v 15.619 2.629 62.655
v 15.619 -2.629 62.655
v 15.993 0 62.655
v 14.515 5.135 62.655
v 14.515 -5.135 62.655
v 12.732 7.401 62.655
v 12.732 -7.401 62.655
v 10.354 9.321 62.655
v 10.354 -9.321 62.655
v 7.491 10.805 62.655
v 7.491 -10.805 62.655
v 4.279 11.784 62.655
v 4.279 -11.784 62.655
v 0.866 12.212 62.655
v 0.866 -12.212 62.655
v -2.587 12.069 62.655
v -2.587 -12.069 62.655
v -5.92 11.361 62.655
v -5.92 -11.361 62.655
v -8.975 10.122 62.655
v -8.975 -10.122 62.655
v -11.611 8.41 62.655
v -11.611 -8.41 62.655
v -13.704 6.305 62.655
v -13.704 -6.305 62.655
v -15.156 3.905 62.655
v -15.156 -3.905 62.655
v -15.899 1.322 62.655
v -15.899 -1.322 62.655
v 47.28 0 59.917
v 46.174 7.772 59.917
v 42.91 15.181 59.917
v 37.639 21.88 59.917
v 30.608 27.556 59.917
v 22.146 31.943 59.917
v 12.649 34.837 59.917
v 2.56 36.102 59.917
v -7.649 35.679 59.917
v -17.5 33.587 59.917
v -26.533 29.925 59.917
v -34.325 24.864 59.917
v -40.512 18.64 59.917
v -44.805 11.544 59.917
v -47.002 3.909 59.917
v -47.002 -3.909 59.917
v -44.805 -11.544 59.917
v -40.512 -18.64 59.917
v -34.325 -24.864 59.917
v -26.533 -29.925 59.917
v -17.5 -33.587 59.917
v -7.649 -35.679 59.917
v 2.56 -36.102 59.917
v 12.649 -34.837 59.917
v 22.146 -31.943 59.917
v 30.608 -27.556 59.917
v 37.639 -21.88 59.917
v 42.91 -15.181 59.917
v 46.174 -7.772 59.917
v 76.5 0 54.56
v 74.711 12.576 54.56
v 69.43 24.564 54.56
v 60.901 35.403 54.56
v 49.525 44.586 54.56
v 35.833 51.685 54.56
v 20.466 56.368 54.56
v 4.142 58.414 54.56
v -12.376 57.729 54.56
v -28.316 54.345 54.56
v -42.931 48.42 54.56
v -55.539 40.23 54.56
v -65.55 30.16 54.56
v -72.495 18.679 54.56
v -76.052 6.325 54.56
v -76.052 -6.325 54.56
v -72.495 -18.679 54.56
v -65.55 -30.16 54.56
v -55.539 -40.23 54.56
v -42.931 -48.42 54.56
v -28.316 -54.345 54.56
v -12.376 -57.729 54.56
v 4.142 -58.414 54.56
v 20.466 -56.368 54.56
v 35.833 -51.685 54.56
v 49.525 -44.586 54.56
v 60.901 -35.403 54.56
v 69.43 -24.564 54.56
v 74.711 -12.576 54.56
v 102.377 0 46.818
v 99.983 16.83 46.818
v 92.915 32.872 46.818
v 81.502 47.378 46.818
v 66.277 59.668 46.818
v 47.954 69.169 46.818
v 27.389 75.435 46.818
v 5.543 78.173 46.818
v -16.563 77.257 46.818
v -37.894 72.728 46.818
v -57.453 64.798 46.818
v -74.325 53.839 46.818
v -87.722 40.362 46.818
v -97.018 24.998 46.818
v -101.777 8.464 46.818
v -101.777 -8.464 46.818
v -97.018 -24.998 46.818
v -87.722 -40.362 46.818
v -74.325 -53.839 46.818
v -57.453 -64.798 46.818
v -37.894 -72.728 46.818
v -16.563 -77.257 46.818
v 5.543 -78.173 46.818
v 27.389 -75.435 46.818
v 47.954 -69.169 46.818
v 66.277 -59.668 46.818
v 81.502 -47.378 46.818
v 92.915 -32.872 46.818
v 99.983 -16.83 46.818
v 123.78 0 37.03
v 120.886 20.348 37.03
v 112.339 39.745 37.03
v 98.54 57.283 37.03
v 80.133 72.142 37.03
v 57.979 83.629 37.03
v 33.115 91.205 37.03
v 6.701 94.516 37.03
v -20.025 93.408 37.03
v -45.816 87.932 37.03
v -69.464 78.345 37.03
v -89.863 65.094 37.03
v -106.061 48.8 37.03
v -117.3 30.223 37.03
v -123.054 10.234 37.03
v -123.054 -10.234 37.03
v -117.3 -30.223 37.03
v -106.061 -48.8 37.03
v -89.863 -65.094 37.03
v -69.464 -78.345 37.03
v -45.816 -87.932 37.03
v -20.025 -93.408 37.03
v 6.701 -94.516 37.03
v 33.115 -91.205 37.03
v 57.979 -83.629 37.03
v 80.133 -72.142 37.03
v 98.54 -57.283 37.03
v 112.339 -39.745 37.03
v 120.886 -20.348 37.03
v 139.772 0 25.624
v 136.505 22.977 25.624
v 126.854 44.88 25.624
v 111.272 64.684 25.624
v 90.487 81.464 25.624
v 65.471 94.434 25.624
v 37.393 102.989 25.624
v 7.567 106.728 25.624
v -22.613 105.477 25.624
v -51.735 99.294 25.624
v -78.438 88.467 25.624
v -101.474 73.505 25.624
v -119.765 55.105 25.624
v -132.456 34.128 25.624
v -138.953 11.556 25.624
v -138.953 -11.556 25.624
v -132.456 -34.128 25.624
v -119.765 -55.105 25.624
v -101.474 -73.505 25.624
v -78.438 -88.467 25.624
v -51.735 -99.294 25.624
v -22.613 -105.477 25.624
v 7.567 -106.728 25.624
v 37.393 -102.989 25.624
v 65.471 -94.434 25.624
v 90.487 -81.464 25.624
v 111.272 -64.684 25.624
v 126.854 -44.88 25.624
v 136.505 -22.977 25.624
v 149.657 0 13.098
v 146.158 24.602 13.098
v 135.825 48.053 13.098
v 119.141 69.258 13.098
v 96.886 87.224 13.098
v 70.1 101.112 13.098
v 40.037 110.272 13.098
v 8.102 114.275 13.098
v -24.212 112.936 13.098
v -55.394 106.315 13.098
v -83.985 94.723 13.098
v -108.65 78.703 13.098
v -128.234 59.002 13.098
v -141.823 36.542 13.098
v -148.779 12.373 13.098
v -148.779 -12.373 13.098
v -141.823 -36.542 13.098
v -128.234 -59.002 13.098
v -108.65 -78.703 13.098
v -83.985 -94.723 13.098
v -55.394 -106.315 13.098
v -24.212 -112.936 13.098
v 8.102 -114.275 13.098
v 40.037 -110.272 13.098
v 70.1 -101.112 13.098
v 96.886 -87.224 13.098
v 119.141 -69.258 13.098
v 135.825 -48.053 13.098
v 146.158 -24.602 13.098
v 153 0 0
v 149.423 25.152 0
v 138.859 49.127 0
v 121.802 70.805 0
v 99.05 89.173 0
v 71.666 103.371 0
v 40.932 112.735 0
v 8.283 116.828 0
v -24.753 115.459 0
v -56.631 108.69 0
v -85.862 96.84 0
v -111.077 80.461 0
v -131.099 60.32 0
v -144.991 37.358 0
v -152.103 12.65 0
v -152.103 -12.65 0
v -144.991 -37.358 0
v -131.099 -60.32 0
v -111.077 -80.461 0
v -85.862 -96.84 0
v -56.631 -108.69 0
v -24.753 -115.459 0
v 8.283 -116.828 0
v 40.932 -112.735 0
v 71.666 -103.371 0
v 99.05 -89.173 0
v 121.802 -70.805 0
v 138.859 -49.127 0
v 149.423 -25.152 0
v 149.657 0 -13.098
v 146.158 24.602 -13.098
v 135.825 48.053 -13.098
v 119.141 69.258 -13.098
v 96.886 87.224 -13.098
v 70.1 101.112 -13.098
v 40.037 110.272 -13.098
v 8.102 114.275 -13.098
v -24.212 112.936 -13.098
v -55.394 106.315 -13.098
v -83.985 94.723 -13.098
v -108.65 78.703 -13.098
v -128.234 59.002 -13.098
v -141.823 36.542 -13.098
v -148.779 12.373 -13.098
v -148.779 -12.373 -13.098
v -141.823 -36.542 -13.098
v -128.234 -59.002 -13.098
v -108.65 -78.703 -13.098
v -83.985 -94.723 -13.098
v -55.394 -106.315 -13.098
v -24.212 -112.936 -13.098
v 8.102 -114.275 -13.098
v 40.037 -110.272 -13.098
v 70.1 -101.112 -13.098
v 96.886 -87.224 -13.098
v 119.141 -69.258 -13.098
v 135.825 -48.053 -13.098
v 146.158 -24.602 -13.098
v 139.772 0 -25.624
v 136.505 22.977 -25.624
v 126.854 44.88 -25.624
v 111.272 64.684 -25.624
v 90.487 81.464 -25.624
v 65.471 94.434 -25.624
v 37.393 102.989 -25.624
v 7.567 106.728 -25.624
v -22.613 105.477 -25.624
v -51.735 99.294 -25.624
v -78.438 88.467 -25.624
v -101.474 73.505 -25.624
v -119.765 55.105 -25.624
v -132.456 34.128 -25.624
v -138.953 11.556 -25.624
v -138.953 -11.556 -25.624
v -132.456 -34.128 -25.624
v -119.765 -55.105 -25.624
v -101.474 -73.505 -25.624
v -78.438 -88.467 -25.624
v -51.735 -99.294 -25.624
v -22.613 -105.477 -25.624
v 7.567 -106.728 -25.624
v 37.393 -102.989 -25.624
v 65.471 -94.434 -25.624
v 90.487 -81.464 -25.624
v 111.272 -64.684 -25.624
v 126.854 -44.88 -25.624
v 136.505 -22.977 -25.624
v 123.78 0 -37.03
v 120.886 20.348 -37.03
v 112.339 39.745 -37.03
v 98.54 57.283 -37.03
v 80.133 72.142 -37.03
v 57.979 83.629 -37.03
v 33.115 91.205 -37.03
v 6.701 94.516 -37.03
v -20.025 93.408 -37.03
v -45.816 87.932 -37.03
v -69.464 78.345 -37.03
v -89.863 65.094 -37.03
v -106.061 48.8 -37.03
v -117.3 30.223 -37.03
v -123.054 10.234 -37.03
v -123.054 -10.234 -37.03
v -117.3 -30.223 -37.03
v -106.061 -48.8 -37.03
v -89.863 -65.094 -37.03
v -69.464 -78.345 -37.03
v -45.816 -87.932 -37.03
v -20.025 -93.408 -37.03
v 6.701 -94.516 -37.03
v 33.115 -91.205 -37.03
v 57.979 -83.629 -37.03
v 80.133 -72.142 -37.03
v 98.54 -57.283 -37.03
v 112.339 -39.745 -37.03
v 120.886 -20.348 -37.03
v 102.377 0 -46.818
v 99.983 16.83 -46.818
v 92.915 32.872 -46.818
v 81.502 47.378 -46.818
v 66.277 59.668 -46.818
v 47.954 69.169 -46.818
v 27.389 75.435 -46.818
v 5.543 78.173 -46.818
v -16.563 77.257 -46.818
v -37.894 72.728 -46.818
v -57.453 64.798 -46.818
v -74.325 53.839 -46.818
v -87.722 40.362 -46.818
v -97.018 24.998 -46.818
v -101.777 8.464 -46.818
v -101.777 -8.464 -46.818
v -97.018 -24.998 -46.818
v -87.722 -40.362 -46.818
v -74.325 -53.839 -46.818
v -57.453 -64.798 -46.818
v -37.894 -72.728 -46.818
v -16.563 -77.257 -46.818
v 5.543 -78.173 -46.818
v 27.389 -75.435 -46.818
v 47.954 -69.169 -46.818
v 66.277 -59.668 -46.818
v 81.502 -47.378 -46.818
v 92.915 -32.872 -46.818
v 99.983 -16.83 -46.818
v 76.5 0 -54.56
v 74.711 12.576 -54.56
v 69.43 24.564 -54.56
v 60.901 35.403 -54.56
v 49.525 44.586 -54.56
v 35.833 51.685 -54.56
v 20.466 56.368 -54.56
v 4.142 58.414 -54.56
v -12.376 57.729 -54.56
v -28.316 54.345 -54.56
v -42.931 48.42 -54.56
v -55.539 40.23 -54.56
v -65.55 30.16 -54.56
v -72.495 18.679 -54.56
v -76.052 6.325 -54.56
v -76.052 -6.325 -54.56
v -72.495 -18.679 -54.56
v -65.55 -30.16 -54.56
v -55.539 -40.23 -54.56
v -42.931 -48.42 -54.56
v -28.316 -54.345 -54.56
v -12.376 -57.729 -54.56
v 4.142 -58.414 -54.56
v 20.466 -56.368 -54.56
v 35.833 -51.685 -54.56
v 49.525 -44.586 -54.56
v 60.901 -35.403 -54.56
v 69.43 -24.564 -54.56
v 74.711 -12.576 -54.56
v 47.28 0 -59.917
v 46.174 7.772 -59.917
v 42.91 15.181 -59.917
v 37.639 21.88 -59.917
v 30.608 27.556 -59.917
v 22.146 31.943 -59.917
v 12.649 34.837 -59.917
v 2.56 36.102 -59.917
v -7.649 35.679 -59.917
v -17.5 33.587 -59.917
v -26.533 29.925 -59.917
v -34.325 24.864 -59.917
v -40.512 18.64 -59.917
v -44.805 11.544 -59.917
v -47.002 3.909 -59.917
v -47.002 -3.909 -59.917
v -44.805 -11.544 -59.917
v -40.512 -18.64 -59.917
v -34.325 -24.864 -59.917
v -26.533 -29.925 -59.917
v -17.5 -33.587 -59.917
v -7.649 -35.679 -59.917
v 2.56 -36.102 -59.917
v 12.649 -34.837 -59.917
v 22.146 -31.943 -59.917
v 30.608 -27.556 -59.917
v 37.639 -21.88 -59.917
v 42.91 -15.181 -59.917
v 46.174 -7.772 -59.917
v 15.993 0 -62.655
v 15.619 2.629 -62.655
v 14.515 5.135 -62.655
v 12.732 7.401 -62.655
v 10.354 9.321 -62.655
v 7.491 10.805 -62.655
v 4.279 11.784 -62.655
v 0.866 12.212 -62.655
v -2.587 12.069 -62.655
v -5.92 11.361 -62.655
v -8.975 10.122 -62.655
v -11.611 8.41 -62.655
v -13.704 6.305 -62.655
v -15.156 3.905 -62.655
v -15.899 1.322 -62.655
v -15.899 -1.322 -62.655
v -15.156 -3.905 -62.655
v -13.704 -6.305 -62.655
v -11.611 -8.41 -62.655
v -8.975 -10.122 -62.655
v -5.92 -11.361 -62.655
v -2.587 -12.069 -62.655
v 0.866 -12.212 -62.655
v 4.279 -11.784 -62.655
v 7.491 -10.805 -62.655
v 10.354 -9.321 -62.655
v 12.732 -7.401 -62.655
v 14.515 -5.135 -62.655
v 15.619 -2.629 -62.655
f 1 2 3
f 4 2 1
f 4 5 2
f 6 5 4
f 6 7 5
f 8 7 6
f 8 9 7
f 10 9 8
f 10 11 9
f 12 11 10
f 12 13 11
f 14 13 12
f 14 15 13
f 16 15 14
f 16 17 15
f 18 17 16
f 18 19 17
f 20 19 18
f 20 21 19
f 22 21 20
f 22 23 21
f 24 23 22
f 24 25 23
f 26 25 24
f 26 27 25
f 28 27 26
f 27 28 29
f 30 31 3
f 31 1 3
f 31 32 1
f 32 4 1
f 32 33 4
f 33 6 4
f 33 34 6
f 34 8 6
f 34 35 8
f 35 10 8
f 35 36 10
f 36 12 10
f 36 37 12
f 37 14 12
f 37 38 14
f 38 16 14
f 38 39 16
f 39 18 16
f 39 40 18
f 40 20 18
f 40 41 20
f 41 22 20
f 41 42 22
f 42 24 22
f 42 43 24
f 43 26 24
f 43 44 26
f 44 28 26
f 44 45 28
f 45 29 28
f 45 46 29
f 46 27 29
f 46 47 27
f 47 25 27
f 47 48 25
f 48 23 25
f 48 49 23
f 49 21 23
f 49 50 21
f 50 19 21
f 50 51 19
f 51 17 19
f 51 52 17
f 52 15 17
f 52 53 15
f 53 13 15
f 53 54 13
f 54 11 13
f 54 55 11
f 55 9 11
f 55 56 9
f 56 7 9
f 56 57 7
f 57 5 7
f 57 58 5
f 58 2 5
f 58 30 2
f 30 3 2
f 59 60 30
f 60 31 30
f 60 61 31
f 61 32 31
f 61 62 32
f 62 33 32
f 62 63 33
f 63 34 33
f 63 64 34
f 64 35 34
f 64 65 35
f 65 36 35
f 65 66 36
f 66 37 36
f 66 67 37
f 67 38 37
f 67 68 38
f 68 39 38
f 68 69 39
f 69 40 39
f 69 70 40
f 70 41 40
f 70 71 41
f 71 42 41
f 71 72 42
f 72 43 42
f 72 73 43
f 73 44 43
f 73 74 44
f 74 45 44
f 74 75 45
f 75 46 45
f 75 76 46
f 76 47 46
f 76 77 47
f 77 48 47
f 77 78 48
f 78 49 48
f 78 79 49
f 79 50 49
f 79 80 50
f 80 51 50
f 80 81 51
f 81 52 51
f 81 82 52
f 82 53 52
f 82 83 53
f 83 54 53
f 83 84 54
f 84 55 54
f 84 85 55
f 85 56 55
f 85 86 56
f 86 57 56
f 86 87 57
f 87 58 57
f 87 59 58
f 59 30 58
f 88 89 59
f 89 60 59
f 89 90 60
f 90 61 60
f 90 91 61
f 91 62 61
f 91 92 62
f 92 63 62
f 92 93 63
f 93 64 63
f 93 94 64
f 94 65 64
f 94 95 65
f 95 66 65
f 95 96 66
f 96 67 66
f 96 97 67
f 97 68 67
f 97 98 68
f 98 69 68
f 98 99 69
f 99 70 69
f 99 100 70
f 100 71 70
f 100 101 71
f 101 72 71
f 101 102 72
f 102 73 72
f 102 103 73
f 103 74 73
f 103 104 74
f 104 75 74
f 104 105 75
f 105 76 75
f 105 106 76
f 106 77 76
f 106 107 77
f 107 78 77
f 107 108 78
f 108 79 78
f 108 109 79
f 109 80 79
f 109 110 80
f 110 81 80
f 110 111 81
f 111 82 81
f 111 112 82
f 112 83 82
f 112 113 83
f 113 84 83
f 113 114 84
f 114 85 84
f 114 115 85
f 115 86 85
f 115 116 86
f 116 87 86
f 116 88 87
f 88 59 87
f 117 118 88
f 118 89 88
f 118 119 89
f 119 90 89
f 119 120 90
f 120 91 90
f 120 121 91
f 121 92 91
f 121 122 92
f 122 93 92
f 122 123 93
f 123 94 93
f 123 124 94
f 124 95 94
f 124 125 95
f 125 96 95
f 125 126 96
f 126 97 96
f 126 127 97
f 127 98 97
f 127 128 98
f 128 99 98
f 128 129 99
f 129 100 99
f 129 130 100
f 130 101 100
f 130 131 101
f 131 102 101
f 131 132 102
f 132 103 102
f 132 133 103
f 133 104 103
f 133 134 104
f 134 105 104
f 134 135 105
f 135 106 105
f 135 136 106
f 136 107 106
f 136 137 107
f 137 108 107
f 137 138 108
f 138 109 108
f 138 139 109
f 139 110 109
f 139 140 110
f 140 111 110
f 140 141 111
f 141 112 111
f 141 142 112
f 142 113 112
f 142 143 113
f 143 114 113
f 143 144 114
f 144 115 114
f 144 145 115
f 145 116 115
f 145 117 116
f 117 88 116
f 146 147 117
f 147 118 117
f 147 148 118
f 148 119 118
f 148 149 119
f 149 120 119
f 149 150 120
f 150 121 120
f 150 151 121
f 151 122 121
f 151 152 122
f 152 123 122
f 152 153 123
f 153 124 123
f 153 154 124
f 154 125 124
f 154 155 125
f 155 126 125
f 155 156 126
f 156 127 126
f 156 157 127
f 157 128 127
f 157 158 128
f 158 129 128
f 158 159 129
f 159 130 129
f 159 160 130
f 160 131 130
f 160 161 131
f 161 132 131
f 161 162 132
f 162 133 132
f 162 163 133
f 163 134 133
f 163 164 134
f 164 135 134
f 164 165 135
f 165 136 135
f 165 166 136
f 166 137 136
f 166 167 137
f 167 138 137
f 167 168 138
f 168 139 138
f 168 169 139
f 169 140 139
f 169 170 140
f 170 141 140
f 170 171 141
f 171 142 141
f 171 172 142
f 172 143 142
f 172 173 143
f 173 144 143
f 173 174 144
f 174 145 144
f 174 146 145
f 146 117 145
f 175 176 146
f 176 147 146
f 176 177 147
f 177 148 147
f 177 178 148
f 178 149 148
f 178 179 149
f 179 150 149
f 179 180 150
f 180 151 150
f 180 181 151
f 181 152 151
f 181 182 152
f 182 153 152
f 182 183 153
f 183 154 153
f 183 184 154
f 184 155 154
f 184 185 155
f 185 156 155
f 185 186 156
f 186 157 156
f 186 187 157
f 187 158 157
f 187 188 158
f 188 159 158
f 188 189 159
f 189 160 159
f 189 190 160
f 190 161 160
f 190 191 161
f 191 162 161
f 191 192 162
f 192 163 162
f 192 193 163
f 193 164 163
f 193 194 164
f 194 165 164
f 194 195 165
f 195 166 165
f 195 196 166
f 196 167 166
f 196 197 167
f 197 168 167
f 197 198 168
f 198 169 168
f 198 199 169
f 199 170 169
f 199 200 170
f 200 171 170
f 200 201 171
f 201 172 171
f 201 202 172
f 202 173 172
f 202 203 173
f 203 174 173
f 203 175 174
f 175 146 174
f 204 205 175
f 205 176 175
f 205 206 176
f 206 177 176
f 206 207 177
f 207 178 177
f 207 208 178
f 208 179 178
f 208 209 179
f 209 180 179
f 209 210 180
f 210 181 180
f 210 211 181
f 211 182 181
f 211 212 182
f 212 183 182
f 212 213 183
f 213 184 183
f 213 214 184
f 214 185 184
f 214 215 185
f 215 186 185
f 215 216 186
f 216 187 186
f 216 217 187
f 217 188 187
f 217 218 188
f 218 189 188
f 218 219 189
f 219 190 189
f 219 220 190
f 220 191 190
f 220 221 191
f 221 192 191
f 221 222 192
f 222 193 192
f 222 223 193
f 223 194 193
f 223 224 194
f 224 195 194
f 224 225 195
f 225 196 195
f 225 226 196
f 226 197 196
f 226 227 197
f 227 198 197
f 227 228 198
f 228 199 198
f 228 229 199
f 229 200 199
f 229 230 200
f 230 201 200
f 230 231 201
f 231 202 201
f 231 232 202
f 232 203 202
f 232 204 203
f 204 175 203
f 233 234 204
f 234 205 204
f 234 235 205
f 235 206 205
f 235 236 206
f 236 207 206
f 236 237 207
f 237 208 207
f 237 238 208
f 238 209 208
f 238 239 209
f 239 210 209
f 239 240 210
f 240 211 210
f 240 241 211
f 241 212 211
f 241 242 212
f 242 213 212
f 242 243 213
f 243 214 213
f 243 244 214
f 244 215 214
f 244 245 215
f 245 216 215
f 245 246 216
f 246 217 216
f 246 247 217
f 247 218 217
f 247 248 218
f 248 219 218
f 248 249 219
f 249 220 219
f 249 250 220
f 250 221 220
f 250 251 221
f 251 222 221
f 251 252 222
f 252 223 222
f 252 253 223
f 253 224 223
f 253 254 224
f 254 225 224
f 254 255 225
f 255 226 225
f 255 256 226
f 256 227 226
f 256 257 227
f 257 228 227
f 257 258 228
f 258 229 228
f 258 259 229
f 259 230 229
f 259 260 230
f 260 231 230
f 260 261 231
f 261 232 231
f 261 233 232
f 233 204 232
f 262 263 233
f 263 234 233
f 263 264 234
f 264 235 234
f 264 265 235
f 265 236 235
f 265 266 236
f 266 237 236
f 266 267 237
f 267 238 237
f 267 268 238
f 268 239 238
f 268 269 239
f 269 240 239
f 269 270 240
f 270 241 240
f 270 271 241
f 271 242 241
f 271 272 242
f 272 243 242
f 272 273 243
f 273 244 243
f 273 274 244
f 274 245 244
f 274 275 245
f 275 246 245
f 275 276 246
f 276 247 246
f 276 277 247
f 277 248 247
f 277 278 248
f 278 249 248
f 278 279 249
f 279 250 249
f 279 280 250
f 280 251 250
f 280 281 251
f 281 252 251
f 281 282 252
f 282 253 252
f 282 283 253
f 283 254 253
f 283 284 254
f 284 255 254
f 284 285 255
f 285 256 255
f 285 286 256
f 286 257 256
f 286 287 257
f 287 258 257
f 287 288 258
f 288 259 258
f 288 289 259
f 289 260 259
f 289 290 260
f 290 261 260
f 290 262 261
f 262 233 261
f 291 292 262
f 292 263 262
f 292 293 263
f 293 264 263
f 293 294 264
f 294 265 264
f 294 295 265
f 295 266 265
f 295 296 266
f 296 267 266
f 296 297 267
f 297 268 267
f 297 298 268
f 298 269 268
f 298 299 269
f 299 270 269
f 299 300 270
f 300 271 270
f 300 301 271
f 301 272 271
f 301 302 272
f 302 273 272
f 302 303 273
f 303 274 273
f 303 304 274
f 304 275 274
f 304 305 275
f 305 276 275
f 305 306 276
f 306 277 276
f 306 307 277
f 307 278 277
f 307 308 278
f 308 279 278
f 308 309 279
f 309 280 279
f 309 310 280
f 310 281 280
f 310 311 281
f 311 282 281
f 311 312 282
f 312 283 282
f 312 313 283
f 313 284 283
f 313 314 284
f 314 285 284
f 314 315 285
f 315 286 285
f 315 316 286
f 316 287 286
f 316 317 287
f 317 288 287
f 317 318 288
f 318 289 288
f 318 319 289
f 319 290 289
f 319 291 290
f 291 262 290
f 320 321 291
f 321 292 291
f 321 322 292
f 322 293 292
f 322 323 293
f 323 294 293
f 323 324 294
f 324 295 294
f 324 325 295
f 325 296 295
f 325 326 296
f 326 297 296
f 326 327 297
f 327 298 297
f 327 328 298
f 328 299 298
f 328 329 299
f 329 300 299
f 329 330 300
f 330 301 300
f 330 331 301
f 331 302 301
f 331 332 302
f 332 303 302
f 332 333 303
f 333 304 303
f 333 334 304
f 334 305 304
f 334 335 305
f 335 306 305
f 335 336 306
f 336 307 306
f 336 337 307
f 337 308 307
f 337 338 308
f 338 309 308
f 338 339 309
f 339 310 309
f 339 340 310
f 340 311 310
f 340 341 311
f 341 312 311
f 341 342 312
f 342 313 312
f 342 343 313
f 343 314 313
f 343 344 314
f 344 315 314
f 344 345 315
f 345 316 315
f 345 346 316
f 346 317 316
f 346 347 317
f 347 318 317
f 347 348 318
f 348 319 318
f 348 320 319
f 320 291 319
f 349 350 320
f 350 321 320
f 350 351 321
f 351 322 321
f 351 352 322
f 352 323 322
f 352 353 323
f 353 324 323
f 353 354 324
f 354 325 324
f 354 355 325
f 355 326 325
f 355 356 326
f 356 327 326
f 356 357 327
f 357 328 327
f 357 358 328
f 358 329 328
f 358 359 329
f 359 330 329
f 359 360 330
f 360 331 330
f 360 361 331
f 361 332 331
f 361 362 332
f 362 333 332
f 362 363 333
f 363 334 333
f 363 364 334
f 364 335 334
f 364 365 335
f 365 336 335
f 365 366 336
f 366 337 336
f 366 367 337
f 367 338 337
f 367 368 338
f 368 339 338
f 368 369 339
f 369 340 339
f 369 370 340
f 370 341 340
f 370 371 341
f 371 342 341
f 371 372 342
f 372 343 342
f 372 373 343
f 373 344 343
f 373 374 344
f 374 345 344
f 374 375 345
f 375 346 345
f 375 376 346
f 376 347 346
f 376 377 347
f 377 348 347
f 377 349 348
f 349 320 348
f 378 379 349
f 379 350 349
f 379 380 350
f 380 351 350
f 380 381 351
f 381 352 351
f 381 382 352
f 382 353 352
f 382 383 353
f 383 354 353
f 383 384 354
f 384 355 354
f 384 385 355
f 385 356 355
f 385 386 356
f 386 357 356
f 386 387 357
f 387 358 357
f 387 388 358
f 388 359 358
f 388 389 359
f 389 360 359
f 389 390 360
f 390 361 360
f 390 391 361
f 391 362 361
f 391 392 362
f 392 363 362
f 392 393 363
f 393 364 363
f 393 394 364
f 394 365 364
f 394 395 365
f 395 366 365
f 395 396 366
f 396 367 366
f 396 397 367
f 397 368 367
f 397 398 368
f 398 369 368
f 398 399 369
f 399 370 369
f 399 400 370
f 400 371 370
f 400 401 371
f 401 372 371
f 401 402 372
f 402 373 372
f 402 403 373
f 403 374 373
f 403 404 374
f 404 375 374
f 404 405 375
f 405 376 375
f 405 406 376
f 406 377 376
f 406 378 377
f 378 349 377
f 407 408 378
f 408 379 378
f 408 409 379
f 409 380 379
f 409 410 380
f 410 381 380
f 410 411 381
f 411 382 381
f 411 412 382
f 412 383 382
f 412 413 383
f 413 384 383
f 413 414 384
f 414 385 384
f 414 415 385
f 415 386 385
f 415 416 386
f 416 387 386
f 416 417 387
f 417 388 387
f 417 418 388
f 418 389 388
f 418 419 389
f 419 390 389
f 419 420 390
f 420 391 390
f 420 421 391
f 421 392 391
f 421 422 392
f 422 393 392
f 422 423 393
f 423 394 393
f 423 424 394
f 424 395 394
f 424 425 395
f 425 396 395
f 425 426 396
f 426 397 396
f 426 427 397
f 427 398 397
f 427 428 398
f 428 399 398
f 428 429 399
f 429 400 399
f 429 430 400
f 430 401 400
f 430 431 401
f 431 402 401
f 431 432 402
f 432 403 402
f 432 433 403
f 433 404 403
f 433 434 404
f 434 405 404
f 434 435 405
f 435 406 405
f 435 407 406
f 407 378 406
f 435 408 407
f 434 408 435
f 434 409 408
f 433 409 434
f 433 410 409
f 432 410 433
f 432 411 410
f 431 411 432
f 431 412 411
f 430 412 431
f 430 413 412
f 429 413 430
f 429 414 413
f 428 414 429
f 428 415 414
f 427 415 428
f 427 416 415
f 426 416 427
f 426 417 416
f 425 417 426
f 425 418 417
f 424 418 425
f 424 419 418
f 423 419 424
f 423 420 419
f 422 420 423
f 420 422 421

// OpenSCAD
// Generated by SolidPython 1.0.1 on 2020-07-29 00:46:53


scale(v = [17, 13, 7]) {
	sphere(r = 9);
}
/***********************************************
*********      SolidPython code:      **********
************************************************
 
# import packages: SolidPython
from solid import *
from solid.utils import *
from itertools import chain, combinations, permutations


class Resize:

    def __init__(self, scad_file):
        self.scad_file = scad_file
        #self.scad_file = import_scad(scad_file)
        # cone/cylinder param:
        self.r1 = 0
        self.r2 = 0
        self.h = 0
        # rectangular prism param:
        self.w = 0
        self.l = 0
        # ellipse param:
        self.r = 0

    # import OpenScad code (file name corresponds to shape)


    # classify shape + parameters
    def assign(self, param1, param2, param3):
        if self.scad_file == 'cone.scad':
            self.r1 = param1
            self.r2 = param2
            self.h = param3
        elif self.scad_file == 'cylinder.scad':
            self.r1 = param1
            self.r2 = param2
            self.h = param3
        elif self.scad_file == 'rectangularPrism.scad':
            self.h = param1
            self.l = param2
            self.w = param3
        else:
            self.r = param1
            self.h = param2

    # resize parameters
    def iterate(self):
        x = range(3, 20, 2)
        i = 1
        if self.scad_file == 'cone.scad':
            tempList = list(permutations(x, 2))
            for temp in tempList:
                param1 = temp[0]
                param2 = temp[1]
                filepath = 'produced_scad_files/' + 'cone' + str(param1) + '_' + str(param2) + '_' + '.scad'
                scad_render_to_file(cylinder(h=param1, r1=param2, r2=0), filepath)

        elif self.scad_file == 'cylinder.scad':
            tempList = list(permutations(x, 3))
            for temp in tempList:
                param1 = temp[0]
                param2 = temp[1]
                filepath = 'produced_scad_files/' + 'cylinder' + str(param1) + '_' + str(param2) + '_' + '.scad'
                scad_render_to_file(cylinder(h=param1, r1=param2, r2=param2), filepath)

        elif self.scad_file == 'rectangularPrism.scad':
            tempList = list(permutations(x, 3))
            for temp in tempList:
                param1 = temp[0]
                param2 = temp[1]
                param3 = temp[2]
                filepath = 'produced_scad_files/' + 'rectangularPrism' + str(param1) + '_' + str(param2) + '_' + str(
                    param3) + '.scad'
                scad_render_to_file(cube(size=(param1, param2, param3)), filepath)

        elif self.scad_file == 'ellipse.scad':
            tempList = list(permutations(x, 4))
            for temp in tempList:
                param1 = temp[0]
                param2 = temp[1]
                param3 = temp[2]
                param4 = temp[3]
                filepath = 'produced_scad_files/' + 'ellipse' + str(param1) + '_' + str(param2) + '_' + str(param3) + '_' + str(param4) + '.scad'
                scad_render_to_file(scale([param1, param2, param3])(sphere(r=param4)), filepath)

    def render_to_scadfile(self):
        scad_render_to_file(scad, 'example.scad') 
 
************************************************/
